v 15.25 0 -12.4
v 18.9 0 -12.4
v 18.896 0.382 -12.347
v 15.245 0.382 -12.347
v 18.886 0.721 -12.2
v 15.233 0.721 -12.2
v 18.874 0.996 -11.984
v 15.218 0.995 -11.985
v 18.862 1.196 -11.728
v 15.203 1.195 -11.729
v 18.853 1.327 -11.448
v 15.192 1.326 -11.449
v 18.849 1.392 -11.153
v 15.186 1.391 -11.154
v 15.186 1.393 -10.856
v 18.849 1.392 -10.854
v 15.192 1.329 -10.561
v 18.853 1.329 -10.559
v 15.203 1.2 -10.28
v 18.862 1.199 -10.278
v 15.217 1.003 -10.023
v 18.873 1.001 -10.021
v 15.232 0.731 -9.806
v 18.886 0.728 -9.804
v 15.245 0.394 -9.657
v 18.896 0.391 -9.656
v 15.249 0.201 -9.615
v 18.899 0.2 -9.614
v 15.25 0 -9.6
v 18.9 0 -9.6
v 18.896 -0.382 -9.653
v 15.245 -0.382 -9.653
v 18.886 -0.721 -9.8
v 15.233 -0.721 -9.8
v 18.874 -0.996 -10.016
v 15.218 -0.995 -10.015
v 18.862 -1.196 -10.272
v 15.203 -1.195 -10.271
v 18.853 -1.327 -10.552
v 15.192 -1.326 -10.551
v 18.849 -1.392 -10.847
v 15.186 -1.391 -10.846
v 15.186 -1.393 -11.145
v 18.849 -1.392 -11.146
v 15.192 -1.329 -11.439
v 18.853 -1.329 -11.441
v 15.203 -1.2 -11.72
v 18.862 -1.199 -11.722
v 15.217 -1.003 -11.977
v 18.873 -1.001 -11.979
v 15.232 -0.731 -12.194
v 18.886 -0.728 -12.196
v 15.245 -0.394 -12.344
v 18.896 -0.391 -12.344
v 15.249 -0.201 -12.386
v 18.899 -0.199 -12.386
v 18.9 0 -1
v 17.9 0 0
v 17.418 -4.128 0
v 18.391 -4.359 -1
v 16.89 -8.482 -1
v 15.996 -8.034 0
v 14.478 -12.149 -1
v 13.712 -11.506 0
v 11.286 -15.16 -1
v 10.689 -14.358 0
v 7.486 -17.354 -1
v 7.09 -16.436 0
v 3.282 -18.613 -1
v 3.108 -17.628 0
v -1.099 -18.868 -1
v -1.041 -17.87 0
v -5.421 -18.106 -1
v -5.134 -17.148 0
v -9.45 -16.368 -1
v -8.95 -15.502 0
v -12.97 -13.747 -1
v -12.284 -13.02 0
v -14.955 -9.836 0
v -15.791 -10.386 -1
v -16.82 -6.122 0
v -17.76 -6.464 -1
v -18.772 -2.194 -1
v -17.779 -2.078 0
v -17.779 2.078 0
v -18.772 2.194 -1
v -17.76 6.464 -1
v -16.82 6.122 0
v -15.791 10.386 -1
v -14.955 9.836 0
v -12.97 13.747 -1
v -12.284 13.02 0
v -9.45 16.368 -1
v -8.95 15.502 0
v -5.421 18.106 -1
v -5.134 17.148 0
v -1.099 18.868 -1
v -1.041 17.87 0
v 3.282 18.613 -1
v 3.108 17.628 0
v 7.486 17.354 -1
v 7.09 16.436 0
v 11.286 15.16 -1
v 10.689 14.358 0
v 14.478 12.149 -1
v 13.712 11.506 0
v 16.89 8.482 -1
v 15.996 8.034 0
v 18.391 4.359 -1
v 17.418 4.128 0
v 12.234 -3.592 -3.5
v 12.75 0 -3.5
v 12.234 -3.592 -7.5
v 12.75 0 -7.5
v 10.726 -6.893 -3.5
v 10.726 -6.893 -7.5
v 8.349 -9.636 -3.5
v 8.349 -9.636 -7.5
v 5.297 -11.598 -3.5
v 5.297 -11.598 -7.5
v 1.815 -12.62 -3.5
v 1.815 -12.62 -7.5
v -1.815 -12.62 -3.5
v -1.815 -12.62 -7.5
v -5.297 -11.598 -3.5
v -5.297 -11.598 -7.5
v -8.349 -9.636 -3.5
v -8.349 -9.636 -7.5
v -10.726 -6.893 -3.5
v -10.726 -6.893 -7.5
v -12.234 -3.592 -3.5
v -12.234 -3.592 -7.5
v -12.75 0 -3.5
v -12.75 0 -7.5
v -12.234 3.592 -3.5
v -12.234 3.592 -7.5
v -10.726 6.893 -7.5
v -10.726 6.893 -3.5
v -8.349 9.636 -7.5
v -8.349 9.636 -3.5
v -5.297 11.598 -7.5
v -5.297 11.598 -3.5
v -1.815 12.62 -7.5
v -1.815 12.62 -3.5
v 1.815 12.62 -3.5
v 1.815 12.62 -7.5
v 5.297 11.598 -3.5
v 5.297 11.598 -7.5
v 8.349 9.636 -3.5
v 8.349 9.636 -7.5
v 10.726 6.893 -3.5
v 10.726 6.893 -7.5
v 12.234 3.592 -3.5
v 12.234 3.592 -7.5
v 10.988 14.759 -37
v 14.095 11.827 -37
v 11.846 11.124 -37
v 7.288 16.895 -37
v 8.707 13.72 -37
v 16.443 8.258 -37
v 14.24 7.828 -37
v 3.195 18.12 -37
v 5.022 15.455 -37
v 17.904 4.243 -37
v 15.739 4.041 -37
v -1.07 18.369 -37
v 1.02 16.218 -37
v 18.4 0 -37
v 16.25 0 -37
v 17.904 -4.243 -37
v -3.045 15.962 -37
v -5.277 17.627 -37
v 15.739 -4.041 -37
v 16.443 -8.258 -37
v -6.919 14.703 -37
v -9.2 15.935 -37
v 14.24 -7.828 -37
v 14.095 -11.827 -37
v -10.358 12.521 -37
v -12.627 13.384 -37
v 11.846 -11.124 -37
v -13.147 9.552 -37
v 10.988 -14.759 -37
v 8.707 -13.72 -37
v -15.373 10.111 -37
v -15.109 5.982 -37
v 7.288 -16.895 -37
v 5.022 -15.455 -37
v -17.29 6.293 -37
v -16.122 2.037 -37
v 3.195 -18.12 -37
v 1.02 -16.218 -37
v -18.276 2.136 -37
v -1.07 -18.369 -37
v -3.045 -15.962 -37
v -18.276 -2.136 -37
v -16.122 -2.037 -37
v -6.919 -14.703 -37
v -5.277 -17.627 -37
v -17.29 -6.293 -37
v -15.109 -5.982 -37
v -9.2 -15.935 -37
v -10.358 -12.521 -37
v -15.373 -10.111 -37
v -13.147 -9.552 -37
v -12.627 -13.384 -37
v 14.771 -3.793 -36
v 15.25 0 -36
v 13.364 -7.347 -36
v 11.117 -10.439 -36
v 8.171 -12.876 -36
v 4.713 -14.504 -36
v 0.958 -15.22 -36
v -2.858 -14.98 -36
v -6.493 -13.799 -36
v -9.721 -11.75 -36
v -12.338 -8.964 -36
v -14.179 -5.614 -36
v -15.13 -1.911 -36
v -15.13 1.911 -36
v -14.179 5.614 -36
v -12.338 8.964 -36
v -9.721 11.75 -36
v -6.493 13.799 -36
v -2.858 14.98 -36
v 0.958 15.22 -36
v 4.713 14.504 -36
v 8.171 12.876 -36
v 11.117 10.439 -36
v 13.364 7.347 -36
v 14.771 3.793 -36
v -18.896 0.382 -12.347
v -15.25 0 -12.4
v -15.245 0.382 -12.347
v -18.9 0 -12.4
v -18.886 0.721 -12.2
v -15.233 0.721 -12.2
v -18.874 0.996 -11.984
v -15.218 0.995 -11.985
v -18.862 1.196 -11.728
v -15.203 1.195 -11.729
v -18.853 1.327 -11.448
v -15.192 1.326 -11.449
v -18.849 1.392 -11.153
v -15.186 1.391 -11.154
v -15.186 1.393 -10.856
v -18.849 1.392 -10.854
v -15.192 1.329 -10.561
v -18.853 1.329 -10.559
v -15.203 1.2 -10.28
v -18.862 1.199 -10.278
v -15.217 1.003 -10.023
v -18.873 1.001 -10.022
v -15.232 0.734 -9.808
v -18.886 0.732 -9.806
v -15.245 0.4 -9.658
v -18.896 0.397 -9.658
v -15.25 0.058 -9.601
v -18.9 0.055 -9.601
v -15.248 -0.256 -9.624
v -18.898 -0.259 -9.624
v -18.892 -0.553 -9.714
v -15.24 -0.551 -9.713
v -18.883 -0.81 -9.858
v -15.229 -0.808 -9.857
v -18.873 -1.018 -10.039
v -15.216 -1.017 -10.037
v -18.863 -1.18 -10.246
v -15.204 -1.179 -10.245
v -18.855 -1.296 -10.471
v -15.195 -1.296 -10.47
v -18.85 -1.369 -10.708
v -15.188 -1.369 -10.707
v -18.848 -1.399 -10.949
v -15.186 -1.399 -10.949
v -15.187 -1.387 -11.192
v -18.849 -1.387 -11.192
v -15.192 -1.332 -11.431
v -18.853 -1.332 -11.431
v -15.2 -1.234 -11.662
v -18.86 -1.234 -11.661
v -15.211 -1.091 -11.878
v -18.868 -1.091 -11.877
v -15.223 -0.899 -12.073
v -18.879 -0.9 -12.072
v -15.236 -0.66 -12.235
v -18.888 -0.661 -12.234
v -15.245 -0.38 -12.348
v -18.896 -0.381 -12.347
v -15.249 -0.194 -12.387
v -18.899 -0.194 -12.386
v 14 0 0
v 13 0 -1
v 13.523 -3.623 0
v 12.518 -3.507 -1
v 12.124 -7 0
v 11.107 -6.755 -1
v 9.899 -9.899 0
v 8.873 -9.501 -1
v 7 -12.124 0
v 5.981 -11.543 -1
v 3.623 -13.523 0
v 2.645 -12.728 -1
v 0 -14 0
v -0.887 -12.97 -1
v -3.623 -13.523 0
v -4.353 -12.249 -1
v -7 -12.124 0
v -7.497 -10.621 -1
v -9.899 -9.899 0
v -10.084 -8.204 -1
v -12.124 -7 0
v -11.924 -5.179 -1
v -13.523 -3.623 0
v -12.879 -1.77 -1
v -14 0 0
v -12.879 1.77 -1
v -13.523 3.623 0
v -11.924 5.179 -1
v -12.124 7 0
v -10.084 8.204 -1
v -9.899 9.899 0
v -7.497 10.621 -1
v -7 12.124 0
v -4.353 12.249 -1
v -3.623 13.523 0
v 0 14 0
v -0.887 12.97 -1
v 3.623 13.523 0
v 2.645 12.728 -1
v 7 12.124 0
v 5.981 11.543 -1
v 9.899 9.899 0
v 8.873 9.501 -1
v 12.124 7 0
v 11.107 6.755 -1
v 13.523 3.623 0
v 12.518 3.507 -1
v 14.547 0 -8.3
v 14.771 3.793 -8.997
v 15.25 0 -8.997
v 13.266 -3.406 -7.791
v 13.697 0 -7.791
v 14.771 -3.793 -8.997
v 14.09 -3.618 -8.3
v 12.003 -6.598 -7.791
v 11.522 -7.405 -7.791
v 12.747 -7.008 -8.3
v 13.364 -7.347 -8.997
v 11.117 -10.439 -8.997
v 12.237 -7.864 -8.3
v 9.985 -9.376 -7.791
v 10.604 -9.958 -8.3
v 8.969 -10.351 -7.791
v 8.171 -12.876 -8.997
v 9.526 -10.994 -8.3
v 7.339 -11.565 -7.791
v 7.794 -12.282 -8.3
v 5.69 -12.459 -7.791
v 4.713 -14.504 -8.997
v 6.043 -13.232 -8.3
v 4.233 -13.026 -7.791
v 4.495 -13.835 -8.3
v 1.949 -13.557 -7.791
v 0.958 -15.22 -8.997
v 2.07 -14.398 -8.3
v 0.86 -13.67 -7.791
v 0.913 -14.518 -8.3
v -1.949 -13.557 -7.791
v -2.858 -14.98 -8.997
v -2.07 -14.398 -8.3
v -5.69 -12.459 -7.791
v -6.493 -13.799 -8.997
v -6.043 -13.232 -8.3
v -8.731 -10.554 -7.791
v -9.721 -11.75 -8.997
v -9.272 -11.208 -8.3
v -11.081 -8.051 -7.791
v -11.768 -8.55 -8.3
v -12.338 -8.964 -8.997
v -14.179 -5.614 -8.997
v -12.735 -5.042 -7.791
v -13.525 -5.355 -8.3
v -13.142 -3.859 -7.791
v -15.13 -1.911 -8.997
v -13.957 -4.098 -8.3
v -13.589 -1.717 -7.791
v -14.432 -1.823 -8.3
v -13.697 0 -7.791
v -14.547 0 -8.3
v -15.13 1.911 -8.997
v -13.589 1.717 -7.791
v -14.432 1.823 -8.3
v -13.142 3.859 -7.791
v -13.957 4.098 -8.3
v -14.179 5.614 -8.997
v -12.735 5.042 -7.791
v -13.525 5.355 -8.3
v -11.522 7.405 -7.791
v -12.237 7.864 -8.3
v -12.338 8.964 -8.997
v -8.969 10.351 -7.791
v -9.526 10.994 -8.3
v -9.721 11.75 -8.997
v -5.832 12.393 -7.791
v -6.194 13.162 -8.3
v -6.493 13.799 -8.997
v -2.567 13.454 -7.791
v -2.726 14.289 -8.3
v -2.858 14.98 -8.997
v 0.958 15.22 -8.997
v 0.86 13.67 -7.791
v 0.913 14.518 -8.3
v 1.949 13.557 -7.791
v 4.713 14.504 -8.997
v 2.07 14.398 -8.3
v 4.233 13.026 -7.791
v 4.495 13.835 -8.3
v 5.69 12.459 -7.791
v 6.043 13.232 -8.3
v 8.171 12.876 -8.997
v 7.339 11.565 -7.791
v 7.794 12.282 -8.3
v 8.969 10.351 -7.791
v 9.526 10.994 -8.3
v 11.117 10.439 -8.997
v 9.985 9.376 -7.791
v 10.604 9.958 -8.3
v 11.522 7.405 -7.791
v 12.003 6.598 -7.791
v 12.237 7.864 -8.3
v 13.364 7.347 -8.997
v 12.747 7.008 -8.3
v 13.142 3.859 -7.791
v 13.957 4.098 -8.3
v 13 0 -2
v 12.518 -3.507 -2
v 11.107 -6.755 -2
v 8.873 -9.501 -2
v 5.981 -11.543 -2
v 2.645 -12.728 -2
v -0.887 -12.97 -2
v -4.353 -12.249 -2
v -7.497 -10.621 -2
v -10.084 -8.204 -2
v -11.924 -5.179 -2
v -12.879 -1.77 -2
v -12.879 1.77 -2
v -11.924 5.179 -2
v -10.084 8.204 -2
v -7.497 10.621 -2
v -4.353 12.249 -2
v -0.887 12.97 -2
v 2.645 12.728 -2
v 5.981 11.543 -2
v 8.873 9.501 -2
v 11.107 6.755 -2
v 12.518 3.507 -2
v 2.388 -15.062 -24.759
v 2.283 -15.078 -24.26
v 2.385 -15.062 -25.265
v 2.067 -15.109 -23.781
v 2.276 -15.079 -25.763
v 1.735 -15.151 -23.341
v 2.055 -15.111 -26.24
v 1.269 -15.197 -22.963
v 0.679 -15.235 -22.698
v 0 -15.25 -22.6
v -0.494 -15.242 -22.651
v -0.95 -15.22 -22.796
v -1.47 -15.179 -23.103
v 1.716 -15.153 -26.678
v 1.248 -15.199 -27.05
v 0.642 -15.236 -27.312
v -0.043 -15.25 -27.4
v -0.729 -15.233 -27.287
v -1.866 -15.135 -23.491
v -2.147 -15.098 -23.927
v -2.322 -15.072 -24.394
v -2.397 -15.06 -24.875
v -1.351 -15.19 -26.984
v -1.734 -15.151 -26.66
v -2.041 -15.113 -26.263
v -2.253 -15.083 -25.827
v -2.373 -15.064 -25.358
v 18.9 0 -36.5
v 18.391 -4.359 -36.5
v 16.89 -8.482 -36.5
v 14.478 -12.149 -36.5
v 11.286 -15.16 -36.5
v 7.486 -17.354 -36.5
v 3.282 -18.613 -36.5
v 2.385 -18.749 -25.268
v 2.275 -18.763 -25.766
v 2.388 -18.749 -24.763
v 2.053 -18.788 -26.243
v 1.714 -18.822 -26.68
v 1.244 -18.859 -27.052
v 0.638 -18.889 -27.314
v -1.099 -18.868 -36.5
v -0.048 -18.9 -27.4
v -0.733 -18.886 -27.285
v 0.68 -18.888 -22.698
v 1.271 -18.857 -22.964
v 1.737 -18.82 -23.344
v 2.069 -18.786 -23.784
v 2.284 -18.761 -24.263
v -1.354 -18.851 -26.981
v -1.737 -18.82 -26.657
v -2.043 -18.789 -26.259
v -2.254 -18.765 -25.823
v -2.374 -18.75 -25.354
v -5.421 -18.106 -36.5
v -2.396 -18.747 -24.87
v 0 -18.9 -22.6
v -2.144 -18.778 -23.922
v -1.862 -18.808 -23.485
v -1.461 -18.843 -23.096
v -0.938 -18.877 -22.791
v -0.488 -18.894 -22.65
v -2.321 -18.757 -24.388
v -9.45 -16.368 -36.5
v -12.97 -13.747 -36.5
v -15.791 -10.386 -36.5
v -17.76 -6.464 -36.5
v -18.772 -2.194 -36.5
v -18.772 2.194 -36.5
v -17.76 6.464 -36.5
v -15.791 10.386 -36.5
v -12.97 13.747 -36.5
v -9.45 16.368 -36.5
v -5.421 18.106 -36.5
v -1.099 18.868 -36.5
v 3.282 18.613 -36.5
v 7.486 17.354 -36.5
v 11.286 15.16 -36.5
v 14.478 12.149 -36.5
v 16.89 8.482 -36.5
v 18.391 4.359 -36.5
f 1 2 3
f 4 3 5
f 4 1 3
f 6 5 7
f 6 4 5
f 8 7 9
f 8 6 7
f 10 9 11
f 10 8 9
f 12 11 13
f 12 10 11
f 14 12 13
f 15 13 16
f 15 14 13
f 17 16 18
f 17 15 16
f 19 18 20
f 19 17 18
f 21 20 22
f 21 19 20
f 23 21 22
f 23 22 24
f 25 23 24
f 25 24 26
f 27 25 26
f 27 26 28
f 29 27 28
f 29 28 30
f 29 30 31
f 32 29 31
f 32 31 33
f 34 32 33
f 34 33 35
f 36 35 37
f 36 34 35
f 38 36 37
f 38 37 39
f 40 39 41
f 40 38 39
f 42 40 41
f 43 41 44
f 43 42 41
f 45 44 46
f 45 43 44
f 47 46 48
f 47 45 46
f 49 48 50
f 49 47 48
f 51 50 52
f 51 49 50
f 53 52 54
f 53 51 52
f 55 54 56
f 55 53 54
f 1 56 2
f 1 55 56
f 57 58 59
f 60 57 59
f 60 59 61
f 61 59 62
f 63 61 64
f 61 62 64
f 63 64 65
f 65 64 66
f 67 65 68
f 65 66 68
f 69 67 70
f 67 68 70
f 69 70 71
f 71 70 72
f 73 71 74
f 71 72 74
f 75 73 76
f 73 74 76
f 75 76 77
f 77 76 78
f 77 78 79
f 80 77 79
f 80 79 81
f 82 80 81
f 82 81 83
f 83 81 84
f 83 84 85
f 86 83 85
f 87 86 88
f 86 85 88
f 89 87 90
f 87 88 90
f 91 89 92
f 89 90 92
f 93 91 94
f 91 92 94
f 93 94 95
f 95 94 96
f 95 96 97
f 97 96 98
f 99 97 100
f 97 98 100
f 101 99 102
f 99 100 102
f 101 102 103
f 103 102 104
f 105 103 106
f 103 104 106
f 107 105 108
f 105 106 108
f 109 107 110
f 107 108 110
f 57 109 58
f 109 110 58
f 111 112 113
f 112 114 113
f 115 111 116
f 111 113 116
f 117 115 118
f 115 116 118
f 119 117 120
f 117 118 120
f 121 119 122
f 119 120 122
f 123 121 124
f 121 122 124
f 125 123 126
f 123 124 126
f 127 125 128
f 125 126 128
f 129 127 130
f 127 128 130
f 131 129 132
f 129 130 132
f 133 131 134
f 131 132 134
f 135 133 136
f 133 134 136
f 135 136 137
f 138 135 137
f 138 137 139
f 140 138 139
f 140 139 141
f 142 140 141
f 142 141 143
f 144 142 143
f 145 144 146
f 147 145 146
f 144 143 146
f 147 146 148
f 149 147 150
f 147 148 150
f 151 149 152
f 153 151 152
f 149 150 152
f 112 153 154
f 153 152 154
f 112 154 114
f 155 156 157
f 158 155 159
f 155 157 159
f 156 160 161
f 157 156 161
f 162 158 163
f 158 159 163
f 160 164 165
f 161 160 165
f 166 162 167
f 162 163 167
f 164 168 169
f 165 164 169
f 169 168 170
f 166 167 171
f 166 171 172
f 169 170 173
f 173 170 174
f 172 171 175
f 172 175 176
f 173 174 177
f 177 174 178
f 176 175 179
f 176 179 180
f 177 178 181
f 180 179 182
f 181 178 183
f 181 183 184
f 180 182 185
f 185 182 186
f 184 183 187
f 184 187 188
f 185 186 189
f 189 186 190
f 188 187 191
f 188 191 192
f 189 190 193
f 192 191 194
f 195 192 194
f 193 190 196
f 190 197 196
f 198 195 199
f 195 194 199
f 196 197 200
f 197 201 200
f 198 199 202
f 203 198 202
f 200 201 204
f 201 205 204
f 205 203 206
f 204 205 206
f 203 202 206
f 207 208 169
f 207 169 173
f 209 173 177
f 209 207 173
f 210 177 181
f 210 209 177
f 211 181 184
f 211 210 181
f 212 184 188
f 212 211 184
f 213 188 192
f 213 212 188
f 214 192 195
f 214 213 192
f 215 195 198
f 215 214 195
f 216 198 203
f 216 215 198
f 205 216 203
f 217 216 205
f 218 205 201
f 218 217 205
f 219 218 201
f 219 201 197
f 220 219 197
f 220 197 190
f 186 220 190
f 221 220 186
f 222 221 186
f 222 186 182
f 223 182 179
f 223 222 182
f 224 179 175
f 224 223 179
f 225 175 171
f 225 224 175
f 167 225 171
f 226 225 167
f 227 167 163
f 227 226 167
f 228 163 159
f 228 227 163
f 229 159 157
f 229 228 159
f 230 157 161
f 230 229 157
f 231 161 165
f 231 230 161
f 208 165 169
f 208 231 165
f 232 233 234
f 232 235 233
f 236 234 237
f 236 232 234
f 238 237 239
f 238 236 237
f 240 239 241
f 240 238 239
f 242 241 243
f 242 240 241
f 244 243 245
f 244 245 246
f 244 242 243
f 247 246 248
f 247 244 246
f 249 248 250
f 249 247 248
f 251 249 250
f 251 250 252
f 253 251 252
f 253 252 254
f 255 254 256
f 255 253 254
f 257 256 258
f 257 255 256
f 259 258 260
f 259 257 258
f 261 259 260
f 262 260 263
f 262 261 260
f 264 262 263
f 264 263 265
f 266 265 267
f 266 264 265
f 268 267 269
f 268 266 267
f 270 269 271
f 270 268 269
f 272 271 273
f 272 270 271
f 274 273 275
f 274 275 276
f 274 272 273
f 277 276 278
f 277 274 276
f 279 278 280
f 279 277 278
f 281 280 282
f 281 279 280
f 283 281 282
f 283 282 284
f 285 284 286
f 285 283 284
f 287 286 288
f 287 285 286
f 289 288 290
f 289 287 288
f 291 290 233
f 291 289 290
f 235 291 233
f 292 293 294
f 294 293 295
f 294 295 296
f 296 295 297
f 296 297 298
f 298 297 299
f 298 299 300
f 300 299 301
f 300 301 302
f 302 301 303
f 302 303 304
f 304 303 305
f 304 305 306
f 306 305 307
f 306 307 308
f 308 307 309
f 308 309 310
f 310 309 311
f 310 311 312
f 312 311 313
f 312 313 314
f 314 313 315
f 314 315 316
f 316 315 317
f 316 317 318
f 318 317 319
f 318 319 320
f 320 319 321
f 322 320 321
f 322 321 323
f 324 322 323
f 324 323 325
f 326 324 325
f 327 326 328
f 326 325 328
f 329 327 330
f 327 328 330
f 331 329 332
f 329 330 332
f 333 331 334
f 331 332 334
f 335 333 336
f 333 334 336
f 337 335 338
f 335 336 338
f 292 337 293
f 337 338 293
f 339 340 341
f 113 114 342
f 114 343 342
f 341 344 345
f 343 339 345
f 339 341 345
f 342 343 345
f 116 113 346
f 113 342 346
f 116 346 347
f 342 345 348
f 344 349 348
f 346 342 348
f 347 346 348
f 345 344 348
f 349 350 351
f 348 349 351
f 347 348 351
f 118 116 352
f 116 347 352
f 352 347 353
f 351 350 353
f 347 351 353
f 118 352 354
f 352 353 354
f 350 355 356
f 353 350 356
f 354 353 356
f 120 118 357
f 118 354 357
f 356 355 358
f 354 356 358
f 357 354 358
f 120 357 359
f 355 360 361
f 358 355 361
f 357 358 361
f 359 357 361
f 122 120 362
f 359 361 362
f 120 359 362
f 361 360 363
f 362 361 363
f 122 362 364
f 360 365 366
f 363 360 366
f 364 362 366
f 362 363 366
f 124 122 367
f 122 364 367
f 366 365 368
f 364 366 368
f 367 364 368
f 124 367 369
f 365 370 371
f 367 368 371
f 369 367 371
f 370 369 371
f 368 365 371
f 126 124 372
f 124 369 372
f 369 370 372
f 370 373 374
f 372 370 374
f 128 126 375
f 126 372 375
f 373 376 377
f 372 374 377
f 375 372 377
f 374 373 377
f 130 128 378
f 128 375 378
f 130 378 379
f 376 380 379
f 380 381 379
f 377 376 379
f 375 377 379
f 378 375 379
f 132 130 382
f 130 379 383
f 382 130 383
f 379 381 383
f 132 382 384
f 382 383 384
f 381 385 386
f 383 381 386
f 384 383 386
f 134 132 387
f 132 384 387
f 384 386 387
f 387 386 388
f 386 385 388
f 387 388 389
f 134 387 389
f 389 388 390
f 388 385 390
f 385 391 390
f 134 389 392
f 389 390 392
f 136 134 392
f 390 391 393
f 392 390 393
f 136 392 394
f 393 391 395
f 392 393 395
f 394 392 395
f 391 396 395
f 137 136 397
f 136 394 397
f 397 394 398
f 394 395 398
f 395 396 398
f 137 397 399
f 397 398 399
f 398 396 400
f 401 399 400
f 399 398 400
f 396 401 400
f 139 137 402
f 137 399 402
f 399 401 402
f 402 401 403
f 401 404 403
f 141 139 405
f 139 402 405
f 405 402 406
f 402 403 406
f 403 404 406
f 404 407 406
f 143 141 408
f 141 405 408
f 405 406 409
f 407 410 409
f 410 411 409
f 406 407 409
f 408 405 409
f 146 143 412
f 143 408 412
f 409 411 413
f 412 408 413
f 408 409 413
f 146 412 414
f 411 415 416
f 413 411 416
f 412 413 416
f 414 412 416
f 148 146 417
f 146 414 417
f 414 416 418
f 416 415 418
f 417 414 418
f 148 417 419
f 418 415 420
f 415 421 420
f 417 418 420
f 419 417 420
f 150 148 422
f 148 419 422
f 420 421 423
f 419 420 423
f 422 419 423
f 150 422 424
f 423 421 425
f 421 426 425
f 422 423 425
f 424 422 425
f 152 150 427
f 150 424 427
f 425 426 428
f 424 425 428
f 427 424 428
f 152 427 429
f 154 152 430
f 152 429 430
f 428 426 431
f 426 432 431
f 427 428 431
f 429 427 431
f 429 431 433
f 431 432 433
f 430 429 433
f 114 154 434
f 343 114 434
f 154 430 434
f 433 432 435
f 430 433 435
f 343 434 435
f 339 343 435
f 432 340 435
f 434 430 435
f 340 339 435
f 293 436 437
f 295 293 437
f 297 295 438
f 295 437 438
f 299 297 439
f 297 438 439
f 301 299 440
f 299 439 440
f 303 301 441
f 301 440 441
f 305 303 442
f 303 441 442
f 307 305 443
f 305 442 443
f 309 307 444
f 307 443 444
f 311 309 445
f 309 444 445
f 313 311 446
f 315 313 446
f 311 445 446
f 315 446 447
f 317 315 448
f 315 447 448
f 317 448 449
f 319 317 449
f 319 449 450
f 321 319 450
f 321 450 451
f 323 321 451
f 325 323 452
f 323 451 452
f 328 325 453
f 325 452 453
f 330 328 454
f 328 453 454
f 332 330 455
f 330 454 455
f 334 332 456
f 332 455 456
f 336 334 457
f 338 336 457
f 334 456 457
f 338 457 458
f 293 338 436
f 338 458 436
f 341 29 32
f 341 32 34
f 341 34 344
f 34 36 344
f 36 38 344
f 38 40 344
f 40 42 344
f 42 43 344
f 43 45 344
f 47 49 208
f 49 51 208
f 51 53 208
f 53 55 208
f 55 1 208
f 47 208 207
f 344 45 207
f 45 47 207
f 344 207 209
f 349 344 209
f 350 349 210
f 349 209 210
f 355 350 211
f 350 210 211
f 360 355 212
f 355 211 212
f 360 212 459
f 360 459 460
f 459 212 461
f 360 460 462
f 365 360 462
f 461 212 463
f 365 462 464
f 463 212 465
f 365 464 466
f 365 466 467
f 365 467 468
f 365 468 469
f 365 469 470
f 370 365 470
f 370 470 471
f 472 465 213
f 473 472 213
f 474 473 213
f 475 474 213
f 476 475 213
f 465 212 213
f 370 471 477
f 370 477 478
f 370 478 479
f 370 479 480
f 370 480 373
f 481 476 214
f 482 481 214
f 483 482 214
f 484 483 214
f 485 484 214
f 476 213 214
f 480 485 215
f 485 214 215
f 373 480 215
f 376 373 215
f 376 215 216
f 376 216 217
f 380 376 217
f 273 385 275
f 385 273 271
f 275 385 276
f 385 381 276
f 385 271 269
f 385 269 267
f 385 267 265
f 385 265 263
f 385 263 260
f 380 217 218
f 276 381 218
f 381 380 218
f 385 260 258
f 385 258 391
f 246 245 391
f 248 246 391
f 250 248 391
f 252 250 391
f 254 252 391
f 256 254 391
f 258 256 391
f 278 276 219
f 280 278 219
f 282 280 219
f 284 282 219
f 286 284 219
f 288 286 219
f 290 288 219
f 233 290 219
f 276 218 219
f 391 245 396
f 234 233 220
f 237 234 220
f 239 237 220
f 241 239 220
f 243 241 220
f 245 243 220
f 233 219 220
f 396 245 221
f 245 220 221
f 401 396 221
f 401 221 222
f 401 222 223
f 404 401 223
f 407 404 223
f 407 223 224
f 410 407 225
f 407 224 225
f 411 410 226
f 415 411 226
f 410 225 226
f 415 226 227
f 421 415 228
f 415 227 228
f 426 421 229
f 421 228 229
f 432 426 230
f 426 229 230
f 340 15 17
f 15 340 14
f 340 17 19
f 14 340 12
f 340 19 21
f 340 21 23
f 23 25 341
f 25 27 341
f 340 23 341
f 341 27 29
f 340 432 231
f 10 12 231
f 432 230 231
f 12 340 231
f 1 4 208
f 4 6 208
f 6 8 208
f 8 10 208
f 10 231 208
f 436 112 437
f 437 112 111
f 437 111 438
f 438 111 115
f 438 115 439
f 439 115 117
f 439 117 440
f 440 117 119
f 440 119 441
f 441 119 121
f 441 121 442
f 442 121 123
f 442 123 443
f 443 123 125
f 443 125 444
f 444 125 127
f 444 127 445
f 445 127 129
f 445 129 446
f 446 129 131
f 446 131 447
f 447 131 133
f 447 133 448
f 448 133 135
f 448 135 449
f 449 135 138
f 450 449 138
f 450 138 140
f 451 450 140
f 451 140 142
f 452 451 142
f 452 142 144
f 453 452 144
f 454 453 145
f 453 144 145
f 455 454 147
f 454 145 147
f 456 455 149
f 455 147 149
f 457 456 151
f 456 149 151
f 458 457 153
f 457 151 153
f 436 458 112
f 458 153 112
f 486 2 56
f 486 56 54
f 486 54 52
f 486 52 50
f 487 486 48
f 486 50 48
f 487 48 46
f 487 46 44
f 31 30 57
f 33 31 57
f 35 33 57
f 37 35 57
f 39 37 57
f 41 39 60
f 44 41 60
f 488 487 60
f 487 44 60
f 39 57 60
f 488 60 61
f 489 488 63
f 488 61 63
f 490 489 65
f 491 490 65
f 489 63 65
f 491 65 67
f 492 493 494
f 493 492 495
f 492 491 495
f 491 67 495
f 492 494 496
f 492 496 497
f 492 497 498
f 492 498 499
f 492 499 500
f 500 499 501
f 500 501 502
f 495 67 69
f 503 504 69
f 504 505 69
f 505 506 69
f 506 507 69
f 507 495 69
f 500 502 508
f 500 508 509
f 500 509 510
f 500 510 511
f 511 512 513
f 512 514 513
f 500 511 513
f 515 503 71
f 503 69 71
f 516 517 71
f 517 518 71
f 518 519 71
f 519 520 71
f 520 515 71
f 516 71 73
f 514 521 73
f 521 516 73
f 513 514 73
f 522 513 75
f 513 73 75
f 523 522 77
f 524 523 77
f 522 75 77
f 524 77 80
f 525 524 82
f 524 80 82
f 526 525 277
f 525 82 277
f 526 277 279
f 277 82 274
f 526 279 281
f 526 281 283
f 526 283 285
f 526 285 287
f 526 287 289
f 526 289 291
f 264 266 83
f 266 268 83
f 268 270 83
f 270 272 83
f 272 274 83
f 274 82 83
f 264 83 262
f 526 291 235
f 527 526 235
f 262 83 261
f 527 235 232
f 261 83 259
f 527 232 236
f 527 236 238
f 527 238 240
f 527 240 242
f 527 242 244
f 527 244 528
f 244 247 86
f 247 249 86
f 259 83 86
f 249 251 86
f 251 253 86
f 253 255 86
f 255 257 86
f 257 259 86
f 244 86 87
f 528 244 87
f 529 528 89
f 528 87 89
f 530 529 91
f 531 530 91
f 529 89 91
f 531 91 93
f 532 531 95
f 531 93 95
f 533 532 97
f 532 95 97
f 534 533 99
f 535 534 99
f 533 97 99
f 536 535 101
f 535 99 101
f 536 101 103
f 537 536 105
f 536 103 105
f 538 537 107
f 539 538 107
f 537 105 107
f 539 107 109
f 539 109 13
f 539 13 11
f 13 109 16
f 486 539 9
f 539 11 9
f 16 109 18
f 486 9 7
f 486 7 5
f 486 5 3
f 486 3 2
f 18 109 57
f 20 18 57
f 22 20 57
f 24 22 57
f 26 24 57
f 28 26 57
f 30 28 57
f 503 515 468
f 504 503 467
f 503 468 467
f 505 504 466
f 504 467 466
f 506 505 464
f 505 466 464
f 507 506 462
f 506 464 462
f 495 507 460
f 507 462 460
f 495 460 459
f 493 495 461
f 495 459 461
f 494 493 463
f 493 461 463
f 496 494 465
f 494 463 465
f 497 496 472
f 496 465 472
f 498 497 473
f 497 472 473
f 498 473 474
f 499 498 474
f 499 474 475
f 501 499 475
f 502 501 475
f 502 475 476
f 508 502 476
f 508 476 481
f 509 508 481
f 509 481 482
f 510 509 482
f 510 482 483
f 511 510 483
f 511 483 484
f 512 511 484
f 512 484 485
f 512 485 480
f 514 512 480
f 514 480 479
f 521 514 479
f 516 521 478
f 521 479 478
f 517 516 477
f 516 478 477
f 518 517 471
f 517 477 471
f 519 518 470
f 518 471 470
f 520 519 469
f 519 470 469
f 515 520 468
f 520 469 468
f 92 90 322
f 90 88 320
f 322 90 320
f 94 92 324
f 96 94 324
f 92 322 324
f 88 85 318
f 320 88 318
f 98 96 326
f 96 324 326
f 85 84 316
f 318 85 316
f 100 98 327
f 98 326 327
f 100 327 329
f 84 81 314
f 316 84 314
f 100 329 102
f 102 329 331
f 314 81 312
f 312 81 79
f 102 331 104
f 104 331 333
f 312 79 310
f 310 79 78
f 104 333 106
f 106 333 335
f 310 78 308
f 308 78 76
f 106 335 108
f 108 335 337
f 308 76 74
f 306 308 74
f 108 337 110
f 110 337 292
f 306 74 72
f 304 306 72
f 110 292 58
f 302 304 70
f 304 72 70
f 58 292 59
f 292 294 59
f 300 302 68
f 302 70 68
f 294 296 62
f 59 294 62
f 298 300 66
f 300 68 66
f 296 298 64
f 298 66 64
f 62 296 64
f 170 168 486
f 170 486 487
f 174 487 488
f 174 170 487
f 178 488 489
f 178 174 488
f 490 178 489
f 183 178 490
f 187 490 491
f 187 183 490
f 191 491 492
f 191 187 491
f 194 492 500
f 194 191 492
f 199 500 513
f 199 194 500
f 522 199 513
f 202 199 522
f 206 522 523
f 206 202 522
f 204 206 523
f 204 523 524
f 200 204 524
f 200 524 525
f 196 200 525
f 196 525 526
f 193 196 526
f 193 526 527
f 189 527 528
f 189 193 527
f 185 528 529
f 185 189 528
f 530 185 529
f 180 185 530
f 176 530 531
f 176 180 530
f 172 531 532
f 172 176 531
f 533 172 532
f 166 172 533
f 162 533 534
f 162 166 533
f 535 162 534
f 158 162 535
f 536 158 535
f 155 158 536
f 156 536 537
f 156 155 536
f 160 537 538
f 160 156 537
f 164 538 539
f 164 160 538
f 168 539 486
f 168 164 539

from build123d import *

# Parameters (mm, degrees)
SKETCH_2_R               = 2.4
CUT_EXTRUDE_1_DEPTH      = 46.644495835
CHAMFER_1_SIZE           = 0.5
CHAMFER_2_SIZE           = 1
CUT_EXTRUDE_2_DEPTH      = 46.644495918
CUT_EXTRUDE_2_DEPTH_BACK = 46.644495918
SKETCH_3_R               = 1.4


with BuildPart() as part:
    # 스케치1 → 회전1 (revolve)
    with BuildSketch(Plane(origin=(0, 0, 0), x_dir=(0, 0, -1), z_dir=(1, 0, 0)), mode=Mode.PRIVATE) as revolve_1_sk:
        with BuildLine():
            Line((0, 13), (2, 13))
            Line((2, 13), (3.5, 12.75))
            Line((3.5, 12.75), (7.5, 12.75))
            ThreePointArc((7.5, 12.75), (8.019590324, 14.137023112), (8.996877215, 15.25))
            Line((8.996877215, 15.25), (37, 15.25))
            Line((37, 15.25), (37, 18.9))
            Line((37, 18.9), (0, 18.9))
            Line((0, 18.9), (0, 13))
        make_face()
    revolve(revolve_1_sk.sketch.rotate(Axis((0, 0, 0), (0, 0, -1)), 90), axis=Axis((0, 0, 0), (0, 0, -1)))

    # 스케치2 → 컷-돌출1 (cut, through all)
    with BuildSketch(Plane(origin=(0, 0, 0), x_dir=(1, 0, 0), z_dir=(0, 1, 0))):
        with Locations(Location((0, 25, 0), (0, 0, 270))):
            Circle(SKETCH_2_R)
    extrude(amount=-CUT_EXTRUDE_1_DEPTH, mode=Mode.SUBTRACT)

    # 모따기1
    chamfer_1_edges = [part.edges().sort_by_distance(p)[0] for p in [
        (-18.9, 0, -37),
    ]]
    chamfer(chamfer_1_edges, length=CHAMFER_1_SIZE)

    # 모따기2
    chamfer_2_edges = [part.edges().sort_by_distance(p)[0] for p in [
        (-18.9, 0, 0),
        (-15.25, 0, -37),
        (-13, 0, 0),
    ]]
    chamfer(chamfer_2_edges, length=CHAMFER_2_SIZE)

    # 스케치3 → 컷-돌출2 (cut, two sides: drawn at the far end of the back side and taken through both)
    with BuildSketch(Plane(origin=(0, 0, 0), x_dir=(0, 0, -1), z_dir=(1, 0, 0)).offset(-CUT_EXTRUDE_2_DEPTH_BACK)):
        with Locations((11, 0)):
            Circle(SKETCH_3_R)
    extrude(amount=CUT_EXTRUDE_2_DEPTH + CUT_EXTRUDE_2_DEPTH_BACK, mode=Mode.SUBTRACT)


solid = part.part
